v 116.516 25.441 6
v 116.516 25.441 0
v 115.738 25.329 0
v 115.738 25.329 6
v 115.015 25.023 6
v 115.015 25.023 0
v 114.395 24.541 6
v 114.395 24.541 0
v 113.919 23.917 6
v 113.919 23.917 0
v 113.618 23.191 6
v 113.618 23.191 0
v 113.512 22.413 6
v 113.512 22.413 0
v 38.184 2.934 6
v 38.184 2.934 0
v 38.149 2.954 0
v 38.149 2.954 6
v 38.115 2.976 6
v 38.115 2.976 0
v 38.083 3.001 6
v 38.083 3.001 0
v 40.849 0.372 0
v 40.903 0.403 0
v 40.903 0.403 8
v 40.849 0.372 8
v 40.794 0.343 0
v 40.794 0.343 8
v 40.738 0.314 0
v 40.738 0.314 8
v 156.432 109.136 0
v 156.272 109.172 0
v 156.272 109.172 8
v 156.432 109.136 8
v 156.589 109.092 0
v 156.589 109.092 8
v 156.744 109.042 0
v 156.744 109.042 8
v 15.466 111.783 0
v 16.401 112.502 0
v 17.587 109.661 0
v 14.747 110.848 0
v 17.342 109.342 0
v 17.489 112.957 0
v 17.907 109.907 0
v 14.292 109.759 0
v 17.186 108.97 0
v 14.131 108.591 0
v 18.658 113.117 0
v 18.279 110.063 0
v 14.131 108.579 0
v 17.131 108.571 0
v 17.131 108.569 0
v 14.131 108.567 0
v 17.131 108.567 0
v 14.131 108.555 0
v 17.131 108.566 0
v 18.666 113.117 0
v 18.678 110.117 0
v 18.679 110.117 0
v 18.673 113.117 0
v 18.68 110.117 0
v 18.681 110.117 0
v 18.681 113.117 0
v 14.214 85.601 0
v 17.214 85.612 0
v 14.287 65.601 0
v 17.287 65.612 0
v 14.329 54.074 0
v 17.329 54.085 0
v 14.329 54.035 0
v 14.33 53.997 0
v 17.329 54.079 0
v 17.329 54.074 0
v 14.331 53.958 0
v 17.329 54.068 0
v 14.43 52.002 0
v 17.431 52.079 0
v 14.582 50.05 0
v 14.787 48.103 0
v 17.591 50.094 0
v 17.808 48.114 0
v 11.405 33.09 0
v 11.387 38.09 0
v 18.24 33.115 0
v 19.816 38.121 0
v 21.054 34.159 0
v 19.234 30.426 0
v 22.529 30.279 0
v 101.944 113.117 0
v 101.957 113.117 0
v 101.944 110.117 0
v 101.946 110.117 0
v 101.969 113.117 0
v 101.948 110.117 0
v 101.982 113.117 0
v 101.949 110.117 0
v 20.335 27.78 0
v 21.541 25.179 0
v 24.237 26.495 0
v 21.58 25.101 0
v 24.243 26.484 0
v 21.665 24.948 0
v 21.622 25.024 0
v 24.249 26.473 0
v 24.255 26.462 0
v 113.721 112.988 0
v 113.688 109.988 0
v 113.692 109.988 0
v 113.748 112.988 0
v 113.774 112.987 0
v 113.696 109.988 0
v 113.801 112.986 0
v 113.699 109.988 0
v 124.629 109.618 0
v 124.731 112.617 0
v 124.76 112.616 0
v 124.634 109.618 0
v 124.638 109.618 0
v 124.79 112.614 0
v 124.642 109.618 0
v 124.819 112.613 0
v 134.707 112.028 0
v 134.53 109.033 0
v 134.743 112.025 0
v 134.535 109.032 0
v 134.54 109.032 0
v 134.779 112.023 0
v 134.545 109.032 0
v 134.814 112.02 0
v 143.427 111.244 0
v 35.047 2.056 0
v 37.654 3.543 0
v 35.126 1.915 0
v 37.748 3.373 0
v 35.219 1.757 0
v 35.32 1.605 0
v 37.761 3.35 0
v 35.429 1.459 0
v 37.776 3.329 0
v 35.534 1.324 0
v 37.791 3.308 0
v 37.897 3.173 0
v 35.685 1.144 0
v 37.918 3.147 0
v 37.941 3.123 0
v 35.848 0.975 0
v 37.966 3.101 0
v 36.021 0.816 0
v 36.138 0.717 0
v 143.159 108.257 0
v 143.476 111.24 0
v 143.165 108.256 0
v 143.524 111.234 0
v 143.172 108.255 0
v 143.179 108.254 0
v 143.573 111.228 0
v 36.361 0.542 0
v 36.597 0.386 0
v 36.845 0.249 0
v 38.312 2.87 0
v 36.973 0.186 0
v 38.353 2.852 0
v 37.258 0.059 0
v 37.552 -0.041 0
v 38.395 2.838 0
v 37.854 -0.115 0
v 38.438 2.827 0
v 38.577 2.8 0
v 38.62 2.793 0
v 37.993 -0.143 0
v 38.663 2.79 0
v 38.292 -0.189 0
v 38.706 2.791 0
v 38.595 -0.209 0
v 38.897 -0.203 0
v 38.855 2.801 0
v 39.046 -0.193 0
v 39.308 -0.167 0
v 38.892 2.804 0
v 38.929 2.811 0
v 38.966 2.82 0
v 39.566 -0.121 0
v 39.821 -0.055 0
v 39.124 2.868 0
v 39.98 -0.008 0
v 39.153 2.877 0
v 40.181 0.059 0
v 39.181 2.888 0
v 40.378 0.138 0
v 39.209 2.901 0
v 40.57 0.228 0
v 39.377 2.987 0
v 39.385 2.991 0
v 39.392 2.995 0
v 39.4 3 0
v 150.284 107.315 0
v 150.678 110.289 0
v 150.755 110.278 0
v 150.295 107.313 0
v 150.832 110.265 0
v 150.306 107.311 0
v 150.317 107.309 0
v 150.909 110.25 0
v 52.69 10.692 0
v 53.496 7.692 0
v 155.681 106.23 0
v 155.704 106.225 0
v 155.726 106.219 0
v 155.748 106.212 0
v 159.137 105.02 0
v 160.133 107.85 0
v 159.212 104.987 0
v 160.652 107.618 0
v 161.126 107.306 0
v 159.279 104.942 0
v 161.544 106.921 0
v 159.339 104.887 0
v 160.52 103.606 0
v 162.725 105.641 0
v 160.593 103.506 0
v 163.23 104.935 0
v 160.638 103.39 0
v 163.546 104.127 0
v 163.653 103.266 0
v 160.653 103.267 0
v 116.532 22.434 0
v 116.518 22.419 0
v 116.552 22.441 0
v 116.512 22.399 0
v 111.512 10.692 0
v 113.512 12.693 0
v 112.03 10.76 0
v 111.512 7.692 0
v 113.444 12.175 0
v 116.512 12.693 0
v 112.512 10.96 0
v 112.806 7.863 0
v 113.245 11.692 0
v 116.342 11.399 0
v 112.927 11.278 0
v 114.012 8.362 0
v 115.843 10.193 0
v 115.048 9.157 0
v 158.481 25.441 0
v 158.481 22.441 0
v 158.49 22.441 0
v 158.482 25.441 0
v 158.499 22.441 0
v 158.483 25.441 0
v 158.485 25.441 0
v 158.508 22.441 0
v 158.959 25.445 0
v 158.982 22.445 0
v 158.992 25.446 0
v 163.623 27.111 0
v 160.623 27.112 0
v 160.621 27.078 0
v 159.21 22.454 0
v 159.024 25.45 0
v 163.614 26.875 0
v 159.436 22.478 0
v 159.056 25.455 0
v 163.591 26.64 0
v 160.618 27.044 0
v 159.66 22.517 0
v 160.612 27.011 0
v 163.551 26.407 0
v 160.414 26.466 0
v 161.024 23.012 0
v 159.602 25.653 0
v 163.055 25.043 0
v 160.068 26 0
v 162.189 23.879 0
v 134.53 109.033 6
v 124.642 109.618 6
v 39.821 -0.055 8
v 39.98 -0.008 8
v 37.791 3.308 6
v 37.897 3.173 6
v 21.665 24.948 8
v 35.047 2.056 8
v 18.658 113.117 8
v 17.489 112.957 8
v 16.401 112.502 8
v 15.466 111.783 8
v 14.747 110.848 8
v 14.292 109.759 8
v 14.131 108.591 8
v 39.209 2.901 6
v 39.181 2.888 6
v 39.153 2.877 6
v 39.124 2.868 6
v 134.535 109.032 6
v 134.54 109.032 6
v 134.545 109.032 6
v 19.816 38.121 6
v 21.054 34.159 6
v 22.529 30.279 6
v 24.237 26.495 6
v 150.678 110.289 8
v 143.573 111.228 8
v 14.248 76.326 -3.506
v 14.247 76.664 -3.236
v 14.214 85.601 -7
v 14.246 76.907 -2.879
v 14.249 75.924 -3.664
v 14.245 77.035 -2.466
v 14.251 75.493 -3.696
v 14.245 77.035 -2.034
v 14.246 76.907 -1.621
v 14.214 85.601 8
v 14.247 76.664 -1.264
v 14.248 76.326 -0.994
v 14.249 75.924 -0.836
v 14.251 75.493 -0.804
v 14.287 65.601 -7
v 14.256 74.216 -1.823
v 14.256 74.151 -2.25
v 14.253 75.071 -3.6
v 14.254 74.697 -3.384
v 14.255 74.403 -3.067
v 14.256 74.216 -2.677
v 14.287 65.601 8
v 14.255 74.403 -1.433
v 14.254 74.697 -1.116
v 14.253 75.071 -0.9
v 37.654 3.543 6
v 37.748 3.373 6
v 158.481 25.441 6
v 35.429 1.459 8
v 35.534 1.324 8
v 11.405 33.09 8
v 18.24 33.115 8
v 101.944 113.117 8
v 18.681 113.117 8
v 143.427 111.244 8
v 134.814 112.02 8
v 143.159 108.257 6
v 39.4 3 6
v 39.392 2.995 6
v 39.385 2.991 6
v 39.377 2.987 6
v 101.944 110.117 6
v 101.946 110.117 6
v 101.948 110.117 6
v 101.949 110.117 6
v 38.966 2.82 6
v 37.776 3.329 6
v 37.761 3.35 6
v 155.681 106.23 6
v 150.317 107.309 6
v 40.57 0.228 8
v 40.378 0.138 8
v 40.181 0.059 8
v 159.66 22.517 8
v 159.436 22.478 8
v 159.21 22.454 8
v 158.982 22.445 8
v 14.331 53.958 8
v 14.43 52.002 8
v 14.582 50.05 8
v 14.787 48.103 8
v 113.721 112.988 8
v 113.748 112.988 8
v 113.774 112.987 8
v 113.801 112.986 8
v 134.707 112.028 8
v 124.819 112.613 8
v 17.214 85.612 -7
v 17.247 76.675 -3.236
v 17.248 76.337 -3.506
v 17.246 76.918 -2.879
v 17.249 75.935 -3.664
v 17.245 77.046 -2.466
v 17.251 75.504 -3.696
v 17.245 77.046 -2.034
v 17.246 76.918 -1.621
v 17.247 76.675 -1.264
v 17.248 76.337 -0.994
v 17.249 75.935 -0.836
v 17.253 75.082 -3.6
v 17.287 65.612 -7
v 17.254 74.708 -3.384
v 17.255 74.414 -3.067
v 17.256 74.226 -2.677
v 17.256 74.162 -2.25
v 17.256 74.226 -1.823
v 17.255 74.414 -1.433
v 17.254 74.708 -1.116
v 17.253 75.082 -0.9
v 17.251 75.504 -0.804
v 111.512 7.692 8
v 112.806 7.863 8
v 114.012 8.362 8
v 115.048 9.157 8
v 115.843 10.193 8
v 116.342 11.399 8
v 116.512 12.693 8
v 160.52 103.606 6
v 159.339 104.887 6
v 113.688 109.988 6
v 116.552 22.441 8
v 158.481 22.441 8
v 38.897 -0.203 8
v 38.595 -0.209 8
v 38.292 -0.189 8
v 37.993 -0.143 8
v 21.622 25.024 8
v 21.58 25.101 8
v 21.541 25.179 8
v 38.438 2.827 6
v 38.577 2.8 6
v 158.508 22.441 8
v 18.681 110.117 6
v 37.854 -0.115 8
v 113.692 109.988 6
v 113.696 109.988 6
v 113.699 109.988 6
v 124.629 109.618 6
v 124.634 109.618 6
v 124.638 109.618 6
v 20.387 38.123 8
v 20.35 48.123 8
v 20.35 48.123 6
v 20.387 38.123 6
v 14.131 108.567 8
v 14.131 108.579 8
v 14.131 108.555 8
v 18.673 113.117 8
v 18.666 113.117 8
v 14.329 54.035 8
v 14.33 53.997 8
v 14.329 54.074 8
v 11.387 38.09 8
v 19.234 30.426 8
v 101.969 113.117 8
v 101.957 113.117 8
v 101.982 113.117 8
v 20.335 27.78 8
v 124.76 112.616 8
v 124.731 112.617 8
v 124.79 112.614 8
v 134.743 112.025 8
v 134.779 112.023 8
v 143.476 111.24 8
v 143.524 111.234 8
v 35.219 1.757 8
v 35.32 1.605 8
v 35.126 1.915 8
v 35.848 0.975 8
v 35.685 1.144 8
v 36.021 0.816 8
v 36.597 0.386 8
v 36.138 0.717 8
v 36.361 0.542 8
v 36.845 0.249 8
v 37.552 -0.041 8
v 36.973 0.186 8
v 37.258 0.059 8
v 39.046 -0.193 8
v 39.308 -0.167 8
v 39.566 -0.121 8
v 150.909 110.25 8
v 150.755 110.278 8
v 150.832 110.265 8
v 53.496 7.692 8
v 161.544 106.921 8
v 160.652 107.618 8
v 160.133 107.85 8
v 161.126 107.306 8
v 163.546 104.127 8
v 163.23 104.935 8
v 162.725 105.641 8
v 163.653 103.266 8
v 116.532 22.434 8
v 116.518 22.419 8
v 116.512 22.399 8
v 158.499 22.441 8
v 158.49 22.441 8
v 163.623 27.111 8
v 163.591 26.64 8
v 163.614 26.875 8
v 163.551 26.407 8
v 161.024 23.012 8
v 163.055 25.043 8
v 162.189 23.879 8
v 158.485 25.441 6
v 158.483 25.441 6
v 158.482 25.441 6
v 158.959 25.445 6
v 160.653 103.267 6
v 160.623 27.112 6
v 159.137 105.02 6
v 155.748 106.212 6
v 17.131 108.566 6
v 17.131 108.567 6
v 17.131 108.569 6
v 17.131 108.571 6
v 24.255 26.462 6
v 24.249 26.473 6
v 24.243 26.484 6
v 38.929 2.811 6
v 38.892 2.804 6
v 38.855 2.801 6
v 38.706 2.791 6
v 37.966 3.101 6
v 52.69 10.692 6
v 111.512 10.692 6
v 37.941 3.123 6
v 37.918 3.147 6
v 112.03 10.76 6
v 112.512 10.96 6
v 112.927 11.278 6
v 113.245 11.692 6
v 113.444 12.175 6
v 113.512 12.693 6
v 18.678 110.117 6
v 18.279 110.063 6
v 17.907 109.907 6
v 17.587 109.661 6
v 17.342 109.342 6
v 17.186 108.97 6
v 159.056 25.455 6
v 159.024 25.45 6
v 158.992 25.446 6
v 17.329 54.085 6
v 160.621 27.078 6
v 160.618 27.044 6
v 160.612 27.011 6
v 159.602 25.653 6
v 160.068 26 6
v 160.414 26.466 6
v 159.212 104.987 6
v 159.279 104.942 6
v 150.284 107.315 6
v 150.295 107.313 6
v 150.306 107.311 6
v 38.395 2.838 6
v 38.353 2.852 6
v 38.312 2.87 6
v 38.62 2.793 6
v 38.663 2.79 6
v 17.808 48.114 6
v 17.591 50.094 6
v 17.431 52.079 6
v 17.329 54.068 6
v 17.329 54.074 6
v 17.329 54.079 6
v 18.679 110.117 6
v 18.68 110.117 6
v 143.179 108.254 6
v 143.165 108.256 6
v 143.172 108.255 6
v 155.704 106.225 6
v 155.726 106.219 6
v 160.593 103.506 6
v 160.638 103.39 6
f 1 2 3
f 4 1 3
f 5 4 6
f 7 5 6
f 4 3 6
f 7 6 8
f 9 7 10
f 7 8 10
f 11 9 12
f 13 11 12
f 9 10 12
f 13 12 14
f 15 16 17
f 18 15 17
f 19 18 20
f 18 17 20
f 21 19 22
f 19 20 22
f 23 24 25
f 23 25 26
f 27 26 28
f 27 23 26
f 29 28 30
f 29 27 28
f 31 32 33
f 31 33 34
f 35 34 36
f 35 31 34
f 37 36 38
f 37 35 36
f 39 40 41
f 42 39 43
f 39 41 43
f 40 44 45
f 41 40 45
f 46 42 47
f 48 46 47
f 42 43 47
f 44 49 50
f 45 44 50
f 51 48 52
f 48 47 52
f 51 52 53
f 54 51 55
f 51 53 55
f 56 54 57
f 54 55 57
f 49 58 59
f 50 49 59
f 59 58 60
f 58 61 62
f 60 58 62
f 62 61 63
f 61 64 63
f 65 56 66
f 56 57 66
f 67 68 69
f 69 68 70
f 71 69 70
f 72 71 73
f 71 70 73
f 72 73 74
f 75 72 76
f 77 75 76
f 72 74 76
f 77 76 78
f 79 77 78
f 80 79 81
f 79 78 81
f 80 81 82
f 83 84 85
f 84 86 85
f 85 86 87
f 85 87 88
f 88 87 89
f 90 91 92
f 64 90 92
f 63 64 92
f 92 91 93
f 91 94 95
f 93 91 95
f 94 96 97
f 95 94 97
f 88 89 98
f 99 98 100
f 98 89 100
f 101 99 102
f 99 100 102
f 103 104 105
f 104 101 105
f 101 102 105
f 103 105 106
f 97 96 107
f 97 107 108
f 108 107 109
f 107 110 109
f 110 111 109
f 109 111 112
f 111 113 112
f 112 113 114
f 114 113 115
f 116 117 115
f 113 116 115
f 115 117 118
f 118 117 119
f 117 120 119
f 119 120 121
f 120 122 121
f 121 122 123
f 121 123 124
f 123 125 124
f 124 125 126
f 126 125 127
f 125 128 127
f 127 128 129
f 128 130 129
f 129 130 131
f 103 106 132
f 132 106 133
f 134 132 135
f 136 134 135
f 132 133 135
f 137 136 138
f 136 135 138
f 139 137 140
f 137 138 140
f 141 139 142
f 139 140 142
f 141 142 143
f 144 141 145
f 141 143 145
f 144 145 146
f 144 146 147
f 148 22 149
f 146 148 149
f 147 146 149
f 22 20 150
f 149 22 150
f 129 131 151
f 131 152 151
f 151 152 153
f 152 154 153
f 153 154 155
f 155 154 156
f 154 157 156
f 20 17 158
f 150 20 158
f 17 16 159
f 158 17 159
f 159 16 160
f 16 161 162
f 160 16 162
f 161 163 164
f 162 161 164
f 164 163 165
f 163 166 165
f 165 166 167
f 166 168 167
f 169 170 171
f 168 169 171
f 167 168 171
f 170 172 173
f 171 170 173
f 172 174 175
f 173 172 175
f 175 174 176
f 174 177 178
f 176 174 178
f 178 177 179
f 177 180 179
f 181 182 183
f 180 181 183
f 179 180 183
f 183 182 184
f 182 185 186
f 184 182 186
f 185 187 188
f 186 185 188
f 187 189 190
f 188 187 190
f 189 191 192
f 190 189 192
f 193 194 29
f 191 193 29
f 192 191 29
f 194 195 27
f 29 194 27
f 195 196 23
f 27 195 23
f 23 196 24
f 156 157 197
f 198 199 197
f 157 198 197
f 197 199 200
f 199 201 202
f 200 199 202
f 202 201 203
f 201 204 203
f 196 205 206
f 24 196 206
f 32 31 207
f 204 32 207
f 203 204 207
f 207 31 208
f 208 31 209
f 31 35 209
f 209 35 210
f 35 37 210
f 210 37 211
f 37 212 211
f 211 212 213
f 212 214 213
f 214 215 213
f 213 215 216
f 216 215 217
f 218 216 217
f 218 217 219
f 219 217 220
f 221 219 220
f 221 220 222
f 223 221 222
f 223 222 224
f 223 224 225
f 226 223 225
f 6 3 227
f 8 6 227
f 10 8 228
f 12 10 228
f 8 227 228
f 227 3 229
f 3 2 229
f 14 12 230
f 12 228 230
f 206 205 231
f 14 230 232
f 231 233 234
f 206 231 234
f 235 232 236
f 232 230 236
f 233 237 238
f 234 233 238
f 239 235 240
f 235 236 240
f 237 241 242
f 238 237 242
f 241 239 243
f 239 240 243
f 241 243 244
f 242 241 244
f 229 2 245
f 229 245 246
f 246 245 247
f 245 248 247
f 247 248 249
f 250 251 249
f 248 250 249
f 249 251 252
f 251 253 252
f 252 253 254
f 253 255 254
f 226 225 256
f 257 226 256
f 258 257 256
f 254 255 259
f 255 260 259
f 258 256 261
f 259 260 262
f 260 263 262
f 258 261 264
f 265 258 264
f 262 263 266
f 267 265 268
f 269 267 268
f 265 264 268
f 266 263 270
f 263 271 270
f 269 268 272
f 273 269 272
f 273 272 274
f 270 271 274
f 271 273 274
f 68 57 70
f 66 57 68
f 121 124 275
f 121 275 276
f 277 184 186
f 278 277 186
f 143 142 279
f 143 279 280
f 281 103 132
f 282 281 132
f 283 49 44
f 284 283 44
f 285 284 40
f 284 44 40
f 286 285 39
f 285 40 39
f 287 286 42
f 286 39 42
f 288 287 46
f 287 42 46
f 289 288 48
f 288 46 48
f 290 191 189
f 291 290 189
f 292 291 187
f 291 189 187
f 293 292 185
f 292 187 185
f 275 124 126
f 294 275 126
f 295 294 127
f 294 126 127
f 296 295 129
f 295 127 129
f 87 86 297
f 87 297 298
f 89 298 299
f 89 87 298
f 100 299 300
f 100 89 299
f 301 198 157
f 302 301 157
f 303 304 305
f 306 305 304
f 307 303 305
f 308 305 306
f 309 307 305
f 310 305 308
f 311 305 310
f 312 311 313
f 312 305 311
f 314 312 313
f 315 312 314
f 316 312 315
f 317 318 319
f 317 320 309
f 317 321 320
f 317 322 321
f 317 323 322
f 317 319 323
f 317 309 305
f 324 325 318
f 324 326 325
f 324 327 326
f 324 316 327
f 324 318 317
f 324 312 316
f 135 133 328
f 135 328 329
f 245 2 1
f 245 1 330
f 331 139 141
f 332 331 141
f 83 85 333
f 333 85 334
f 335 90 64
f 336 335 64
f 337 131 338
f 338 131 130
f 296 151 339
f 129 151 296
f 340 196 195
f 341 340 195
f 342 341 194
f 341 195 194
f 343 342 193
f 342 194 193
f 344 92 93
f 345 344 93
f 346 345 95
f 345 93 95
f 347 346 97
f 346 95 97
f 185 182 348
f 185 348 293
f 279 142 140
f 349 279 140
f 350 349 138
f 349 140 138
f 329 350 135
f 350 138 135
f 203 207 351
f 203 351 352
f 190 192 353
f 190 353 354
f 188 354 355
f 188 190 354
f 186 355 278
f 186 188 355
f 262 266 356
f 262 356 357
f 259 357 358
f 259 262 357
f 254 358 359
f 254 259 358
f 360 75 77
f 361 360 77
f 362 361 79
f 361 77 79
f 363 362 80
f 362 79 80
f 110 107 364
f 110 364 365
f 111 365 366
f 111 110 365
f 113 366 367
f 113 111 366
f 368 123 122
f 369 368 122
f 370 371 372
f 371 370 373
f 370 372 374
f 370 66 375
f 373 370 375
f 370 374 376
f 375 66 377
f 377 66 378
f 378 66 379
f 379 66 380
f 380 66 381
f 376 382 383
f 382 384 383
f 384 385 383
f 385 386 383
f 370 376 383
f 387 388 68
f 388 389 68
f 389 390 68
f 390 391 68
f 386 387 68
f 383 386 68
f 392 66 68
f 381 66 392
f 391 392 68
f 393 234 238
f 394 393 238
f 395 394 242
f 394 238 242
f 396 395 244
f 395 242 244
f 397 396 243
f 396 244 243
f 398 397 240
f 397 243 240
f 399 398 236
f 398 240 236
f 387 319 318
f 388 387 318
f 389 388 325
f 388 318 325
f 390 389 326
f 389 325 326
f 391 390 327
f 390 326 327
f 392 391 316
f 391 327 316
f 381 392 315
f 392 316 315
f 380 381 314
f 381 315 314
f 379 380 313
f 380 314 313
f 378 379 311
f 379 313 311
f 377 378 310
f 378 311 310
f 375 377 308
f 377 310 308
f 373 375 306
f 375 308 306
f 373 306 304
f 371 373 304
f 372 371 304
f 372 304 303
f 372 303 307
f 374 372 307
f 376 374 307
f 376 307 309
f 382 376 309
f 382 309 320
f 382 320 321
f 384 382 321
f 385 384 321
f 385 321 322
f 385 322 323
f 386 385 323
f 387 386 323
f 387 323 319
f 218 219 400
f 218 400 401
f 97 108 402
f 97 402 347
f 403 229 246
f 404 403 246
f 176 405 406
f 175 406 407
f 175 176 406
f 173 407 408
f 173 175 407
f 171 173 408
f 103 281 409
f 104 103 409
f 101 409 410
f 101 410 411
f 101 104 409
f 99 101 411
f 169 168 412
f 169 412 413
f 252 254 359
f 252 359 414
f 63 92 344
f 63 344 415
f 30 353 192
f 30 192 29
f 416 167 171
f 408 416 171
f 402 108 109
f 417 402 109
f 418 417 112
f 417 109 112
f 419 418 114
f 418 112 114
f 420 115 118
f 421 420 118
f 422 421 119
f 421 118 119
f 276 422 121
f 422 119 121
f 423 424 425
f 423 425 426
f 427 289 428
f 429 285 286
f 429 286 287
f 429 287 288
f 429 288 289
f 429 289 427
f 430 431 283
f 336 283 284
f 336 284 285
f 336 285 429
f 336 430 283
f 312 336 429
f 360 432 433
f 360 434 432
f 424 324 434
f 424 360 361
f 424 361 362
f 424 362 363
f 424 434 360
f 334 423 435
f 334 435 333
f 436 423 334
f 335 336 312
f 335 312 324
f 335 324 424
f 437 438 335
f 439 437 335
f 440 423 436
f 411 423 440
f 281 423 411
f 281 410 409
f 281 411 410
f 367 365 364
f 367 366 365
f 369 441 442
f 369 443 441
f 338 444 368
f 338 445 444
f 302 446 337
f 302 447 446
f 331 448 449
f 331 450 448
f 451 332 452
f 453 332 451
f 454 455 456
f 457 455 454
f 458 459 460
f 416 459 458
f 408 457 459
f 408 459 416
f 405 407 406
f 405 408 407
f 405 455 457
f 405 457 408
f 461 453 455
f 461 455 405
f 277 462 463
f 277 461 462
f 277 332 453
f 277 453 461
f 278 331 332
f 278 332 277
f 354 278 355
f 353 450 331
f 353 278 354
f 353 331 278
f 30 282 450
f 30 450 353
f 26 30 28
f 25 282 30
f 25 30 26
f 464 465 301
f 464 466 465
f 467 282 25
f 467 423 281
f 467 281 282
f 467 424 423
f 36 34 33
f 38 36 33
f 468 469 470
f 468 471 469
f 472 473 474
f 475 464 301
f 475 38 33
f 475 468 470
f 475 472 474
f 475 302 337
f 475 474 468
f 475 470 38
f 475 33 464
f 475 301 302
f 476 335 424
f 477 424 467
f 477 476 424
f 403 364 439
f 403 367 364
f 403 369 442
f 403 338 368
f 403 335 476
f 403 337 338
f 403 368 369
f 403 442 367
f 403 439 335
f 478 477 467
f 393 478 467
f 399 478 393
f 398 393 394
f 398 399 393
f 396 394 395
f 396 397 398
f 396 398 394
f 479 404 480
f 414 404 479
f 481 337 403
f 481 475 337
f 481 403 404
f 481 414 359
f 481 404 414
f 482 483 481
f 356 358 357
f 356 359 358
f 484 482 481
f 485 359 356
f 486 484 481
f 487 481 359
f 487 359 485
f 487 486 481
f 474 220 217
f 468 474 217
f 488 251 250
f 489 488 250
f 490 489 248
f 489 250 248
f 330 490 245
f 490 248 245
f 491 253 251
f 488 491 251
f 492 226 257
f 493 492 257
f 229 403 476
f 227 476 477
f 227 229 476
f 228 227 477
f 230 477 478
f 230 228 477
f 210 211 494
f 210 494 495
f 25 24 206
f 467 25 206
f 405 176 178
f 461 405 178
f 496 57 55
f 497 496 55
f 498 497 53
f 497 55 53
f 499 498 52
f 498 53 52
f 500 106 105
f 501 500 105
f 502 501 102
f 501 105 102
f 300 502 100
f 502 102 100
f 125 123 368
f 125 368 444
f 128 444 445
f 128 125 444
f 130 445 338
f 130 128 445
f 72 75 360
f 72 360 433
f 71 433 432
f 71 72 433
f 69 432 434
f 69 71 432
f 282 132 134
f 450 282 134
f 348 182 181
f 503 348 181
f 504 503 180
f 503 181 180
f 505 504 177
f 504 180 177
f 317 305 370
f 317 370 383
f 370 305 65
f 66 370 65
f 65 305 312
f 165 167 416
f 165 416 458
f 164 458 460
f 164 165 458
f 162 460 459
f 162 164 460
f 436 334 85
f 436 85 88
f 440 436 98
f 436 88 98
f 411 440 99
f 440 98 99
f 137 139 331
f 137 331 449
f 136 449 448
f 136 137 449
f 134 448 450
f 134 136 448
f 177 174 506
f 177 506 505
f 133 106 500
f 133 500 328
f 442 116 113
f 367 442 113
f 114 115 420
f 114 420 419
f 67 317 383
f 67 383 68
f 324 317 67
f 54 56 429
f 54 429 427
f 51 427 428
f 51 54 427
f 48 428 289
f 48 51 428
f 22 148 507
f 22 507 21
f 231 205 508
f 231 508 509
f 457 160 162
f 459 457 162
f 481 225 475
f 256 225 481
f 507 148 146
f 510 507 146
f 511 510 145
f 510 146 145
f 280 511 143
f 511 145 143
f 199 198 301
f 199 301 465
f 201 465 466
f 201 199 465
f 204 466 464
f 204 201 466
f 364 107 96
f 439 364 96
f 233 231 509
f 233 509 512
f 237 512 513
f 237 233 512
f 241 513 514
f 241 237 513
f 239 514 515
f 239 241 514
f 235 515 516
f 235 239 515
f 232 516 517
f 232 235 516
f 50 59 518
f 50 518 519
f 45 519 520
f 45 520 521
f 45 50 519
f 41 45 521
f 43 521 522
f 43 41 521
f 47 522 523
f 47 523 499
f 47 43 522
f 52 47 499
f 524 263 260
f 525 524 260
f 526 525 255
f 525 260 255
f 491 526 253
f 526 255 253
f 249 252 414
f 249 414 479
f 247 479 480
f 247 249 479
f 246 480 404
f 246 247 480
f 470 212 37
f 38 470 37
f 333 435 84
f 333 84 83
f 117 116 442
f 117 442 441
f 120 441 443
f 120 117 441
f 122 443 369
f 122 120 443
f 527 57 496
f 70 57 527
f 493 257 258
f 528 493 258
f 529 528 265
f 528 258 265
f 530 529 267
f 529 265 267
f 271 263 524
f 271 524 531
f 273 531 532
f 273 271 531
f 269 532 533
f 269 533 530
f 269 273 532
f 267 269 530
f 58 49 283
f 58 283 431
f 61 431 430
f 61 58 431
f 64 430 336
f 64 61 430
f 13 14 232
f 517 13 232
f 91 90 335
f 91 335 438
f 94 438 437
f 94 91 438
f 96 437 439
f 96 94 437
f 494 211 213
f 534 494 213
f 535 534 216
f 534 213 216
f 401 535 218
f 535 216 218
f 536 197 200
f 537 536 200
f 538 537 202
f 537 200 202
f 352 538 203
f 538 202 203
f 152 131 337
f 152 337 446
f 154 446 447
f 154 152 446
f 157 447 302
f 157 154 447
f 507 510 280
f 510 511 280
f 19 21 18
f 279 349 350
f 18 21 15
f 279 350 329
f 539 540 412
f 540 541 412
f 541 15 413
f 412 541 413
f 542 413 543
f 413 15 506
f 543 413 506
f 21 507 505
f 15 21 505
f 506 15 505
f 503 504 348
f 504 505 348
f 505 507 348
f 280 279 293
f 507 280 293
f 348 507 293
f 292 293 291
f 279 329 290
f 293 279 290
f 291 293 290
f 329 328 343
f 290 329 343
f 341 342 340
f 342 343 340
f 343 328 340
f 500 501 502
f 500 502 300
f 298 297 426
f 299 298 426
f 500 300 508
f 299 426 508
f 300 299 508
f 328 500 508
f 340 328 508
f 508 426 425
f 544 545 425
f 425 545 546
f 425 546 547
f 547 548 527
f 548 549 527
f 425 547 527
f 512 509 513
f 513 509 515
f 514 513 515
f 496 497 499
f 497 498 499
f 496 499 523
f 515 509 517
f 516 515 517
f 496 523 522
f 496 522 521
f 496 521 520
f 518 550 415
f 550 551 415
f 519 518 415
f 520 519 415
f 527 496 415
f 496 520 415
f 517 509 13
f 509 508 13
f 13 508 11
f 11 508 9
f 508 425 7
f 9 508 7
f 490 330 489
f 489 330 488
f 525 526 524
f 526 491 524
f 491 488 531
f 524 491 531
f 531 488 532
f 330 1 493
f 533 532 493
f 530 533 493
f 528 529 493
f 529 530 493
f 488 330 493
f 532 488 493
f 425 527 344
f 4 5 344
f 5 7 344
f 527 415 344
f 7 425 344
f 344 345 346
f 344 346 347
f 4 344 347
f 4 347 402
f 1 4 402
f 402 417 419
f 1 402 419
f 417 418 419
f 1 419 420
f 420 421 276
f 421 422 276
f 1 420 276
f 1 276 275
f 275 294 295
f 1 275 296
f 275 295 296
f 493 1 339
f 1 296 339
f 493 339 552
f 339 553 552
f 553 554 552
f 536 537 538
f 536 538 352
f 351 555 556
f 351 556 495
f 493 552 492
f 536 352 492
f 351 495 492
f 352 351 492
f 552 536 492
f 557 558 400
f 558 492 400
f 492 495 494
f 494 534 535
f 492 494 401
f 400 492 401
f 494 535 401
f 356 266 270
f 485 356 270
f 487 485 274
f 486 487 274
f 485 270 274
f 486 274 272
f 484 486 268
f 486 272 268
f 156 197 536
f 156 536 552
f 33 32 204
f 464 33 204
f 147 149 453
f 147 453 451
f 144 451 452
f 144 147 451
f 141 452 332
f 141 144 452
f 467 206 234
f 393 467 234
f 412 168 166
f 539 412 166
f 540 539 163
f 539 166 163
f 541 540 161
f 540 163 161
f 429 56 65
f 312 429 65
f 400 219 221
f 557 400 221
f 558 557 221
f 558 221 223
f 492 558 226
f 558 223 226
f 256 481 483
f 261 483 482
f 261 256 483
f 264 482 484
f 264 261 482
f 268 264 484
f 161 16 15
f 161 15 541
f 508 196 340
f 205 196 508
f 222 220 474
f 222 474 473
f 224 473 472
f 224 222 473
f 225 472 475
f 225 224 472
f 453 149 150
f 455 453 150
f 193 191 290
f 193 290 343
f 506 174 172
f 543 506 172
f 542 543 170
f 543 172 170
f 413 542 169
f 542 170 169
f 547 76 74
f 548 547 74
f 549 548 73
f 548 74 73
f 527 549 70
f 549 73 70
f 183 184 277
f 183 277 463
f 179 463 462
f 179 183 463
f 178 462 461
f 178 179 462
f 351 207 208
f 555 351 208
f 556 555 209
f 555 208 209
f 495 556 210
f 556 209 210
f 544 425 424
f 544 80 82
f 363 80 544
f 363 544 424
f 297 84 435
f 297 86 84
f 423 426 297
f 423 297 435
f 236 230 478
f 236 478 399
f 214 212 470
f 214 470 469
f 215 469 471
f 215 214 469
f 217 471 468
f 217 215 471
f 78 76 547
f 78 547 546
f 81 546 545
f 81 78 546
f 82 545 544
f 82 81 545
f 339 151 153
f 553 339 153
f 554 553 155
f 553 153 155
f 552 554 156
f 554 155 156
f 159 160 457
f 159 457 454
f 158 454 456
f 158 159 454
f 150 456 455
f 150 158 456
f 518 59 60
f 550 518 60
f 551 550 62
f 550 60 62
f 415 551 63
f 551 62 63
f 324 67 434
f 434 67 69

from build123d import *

# Parameters (mm, degrees)
PAD009_DEPTH    = 8
POCKET005_DEPTH = 6
SKETCH044_W     = 20
SKETCH044_H     = 15
PAD010_DEPTH    = 3
SKETCH045_R     = 1.45
POCKET006_DEPTH = 149.538323
SKETCH046_W     = 10
SKETCH046_H     = 20
POCKET007_DEPTH = 6
SKETCH047_W     = 5
SKETCH047_H     = 8
PAD011_DEPTH    = 4
PAD012_DEPTH    = 3


with BuildPart() as part:
    # Sketch042 → Pad009 (new body)
    with BuildSketch(Plane.XY):
        with BuildLine():
            ThreePointArc((14.331049, 53.958076), (14.329401, 54.015983), (14.328712, 54.073909))
            Line((14.131233, 108.554683), (14.328712, 54.073909))
            ThreePointArc((14.131233, 108.554683), (14.131214, 108.572623), (14.131287, 108.590561))
            ThreePointArc((18.658021, 113.117293), (15.46591, 111.782672), (14.131287, 108.590561))
            ThreePointArc((18.658021, 113.117293), (18.669616, 113.117351), (18.681211, 113.11737))
            Line((101.94388, 113.11737), (18.681211, 113.11737))
            ThreePointArc((101.94388, 113.11737), (101.963094, 113.117317), (101.982307, 113.117159))
            Line((113.720987, 112.988269), (101.982307, 113.117159))
            ThreePointArc((113.720987, 112.988269), (113.760941, 112.987602), (113.800884, 112.986479))
            Line((124.730854, 112.616759), (113.800884, 112.986479))
            ThreePointArc((124.730854, 112.616759), (124.775077, 112.614983), (124.819274, 112.612649))
            Line((134.707394, 112.027539), (124.819274, 112.612649))
            ThreePointArc((134.707394, 112.027539), (134.760897, 112.023961), (134.814338, 112.019564))
            Line((143.427438, 111.244494), (134.814338, 112.019564))
            ThreePointArc((143.427438, 111.244494), (143.500111, 111.23719), (143.572616, 111.22837))
            Line((150.677556, 110.28877), (143.572616, 111.22837))
            ThreePointArc((150.677556, 110.28877), (150.793483, 110.271459), (150.908765, 110.250277))
            Line((156.272395, 109.171587), (150.908765, 110.250277))
            ThreePointArc((156.272395, 109.171587), (156.5104, 109.115), (156.743872, 109.041926))
            Line((160.133022, 107.849586), (156.743872, 109.041926))
            ThreePointArc((160.133022, 107.849586), (160.895244, 107.471834), (161.543817, 106.92135))
            Line((162.725347, 105.64078), (161.543817, 106.92135))
            ThreePointArc((162.725347, 105.64078), (163.413102, 104.540852), (163.653, 103.265981))
            Line((163.653, 103.265981), (163.62255, 27.110501))
            ThreePointArc((163.62255, 27.110501), (163.60451, 26.756997), (163.550857, 26.407123))
            ThreePointArc((159.660239, 22.516538), (162.188858, 23.878516), (163.550857, 26.407123))
            ThreePointArc((159.660239, 22.516538), (159.323063, 22.464205), (158.982393, 22.444954))
            Line((158.982393, 22.444954), (158.507799, 22.441306))
            ThreePointArc((158.507799, 22.441306), (158.494348, 22.441228), (158.480896, 22.441202))
            Line((116.551548, 22.441202), (158.480896, 22.441202))
            ThreePointArc((116.551548, 22.441202), (116.524186, 22.427455), (116.51234, 22.399217))
            Line((116.51234, 22.399217), (116.51234, 12.693214))
            ThreePointArc((111.511608, 7.69248), (115.048134, 9.156687), (116.51234, 12.693214))
            Line((53.496079, 7.69248), (111.511608, 7.69248))
            Line((40.903121, 0.40324), (53.496079, 7.69248))
            ThreePointArc((40.903121, 0.40324), (40.82134, 0.357354), (40.738359, 0.313675))
            Line((40.570469, 0.228155), (40.738359, 0.313675))
            ThreePointArc((40.570469, 0.228155), (40.28044, 0.096677), (39.97966, -0.007897))
            Line((39.821, -0.055087), (39.97966, -0.007897))
            ThreePointArc((39.821, -0.055087), (39.4375, -0.145999), (39.04621, -0.193218))
            Line((38.89726, -0.202728), (39.04621, -0.193218))
            ThreePointArc((38.89726, -0.202728), (38.443297, -0.202212), (37.99322, -0.142943))
            Line((37.85444, -0.115413), (37.99322, -0.142943))
            ThreePointArc((37.85444, -0.115413), (37.403892, 0.005662), (36.973449, 0.185583))
            Line((36.845299, 0.249493), (36.973449, 0.185583))
            ThreePointArc((36.845299, 0.249493), (36.477576, 0.461653), (36.138245, 0.716774))
            Line((36.021215, 0.816424), (36.138245, 0.716774))
            ThreePointArc((36.021215, 0.816424), (35.764889, 1.057957), (35.534135, 1.324028))
            Line((35.428675, 1.458768), (35.534135, 1.324028))
            ThreePointArc((35.428675, 1.458768), (35.268511, 1.680768), (35.126187, 1.914607))
            Line((35.047407, 2.056233), (35.126187, 1.914607))
            Line((21.664757, 24.948224), (35.047407, 2.056233))
            ThreePointArc((21.664757, 24.948224), (21.600836, 25.062414), (21.541228, 25.178913))
            ThreePointArc((14.331049, 53.958076), (16.428723, 39.190834), (21.541228, 25.178913))
        make_face()
    extrude(amount=PAD009_DEPTH)

    # Sketch043 → Pocket005 (cut)
    with BuildSketch(Plane.XY):
        with BuildLine():
            ThreePointArc((17.329026, 54.068236), (19.338784, 39.919906), (24.237019, 26.495239))
            ThreePointArc((24.254666, 26.462283), (24.245534, 26.478596), (24.237019, 26.495239))
            Line((24.254666, 26.462283), (37.653506, 3.542597))
            Line((37.653506, 3.542597), (37.747881, 3.372935))
            ThreePointArc((37.791094, 3.307815), (37.768213, 3.33953), (37.747881, 3.372935))
            Line((37.791094, 3.307815), (37.896554, 3.173075))
            ThreePointArc((37.966136, 3.100561), (37.929518, 3.135065), (37.896554, 3.173075))
            Line((37.966136, 3.100561), (38.083166, 3.000911))
            ThreePointArc((38.184174, 2.934156), (38.131642, 2.964465), (38.083166, 3.000911))
            Line((38.184174, 2.934156), (38.312324, 2.870246))
            ThreePointArc((38.43818, 2.827247), (38.373816, 2.844543), (38.312324, 2.870246))
            Line((38.43818, 2.827247), (38.57696, 2.799717))
            ThreePointArc((38.706109, 2.791176), (38.641257, 2.79125), (38.57696, 2.799717))
            Line((38.706109, 2.791176), (38.855059, 2.800686))
            ThreePointArc((38.965743, 2.820419), (38.910957, 2.807432), (38.855059, 2.800686))
            Line((38.965743, 2.820419), (39.124403, 2.867609))
            ThreePointArc((39.208804, 2.901331), (39.167371, 2.882548), (39.124403, 2.867609))
            Line((39.208804, 2.901331), (39.376694, 2.986851))
            ThreePointArc((39.400232, 2.999646), (39.388549, 2.993091), (39.376694, 2.986851))
            Line((39.400232, 2.999646), (52.690443, 10.69248))
            Line((52.690443, 10.69248), (111.512203, 10.69248))
            ThreePointArc((111.512203, 10.69248), (112.926813, 11.278007), (113.51234, 12.692618))
            Line((113.51234, 22.413147), (113.51234, 12.692618))
            ThreePointArc((116.515571, 25.441202), (114.395073, 24.540983), (113.51234, 22.413147))
            Line((116.515571, 25.441202), (158.480896, 25.441202))
            ThreePointArc((158.484739, 25.441217), (158.482818, 25.441206), (158.480896, 25.441202))
            Line((158.959333, 25.444865), (158.484739, 25.441217))
            ThreePointArc((159.056169, 25.455091), (159.008, 25.447615), (158.959333, 25.444865))
            ThreePointArc((159.056169, 25.455091), (160.067546, 25.999845), (160.612308, 27.011218))
            ThreePointArc((160.62255, 27.111701), (160.619973, 27.0612), (160.612308, 27.011218))
            Line((160.653, 103.26718), (160.62255, 27.111701))
            ThreePointArc((160.520478, 103.606437), (160.618729, 103.449305), (160.653, 103.26718))
            Line((160.520478, 103.606437), (159.338948, 104.887007))
            ThreePointArc((159.137406, 105.019612), (159.246295, 104.965648), (159.338948, 104.887007))
            Line((159.137406, 105.019612), (155.748256, 106.211952))
            ThreePointArc((155.680902, 106.230475), (155.714903, 106.222391), (155.748256, 106.211952))
            Line((155.680902, 106.230475), (150.317272, 107.309165))
            ThreePointArc((150.284242, 107.314664), (150.300803, 107.312191), (150.317272, 107.309165))
            Line((150.284242, 107.314664), (143.179302, 108.254264))
            ThreePointArc((143.158563, 108.256568), (143.168944, 108.255524), (143.179302, 108.254264))
            Line((143.158563, 108.256568), (134.545463, 109.031638))
            ThreePointArc((134.530185, 109.032777), (134.537828, 109.032266), (134.545463, 109.031638))
            Line((134.530185, 109.032777), (124.642065, 109.617887))
            ThreePointArc((124.629433, 109.618474), (124.635751, 109.61822), (124.642065, 109.617887))
            Line((124.629433, 109.618474), (113.699463, 109.988194))
            ThreePointArc((113.68805, 109.98845), (113.693757, 109.988355), (113.699463, 109.988194))
            Line((113.68805, 109.98845), (101.94937, 110.11734))
            ThreePointArc((101.94388, 110.11737), (101.946625, 110.117362), (101.94937, 110.11734))
            Line((101.94388, 110.11737), (18.681211, 110.11737))
            ThreePointArc((18.677898, 110.117359), (18.679554, 110.117367), (18.681211, 110.11737))
            ThreePointArc((18.677898, 110.117359), (17.58723, 109.661351), (17.131221, 108.570683))
            ThreePointArc((17.131213, 108.565558), (17.131211, 108.56812), (17.131221, 108.570683))
            Line((17.131213, 108.565558), (17.328692, 54.084784))
            ThreePointArc((17.329026, 54.068236), (17.328791, 54.076508), (17.328692, 54.084784))
        make_face()
    extrude(amount=POCKET005_DEPTH, mode=Mode.SUBTRACT)

    # Sketch044 → Pad010 (new body)
    with BuildSketch(Plane(origin=(14.524525, 0.052648, 0), x_dir=(0.003625, -0.999993, 0), z_dir=(-0.999993, -0.003625, 0))):
        with Locations((-75.54892, 0.5)):
            Rectangle(SKETCH044_W, SKETCH044_H)
    extrude(amount=-PAD010_DEPTH)

    # Sketch045 (on Face112 of Pad010) → Pocket006 (cut, through all)
    with BuildSketch(Plane(origin=(14.524525, 0.052648, 0), x_dir=(0.003625, -0.999993, 0), z_dir=(-0.999993, -0.003625, 0))):
        with Locations((-75.54892, -2.25)):
            Circle(SKETCH045_R)
    extrude(amount=-POCKET006_DEPTH, mode=Mode.SUBTRACT)

    # Sketch046 (on Face3 of Pocket006) → Pocket007 (cut)
    with BuildSketch(Plane(origin=(14.524525, 0.052648, 0), x_dir=(0.003625, -0.999993, 0), z_dir=(-0.999993, -0.003625, 0))):
        with Locations((-43.04892, -2)):
            Rectangle(SKETCH046_W, SKETCH046_H)
    extrude(amount=-POCKET007_DEPTH, mode=Mode.SUBTRACT)

    # Sketch047 (on Face3 of Pocket007) → Pad011 (new body)
    with BuildSketch(Plane(origin=(14.524525, 0.052648, 0), x_dir=(0.003625, -0.999993, 0), z_dir=(-0.999993, -0.003625, 0))):
        with Locations((-35.54892, 4)):
            Rectangle(SKETCH047_W, SKETCH047_H)
    extrude(amount=-PAD011_DEPTH)

    # Sketch047 (on Face3 of Pocket007) → Pad012 (new body)
    with BuildSketch(Plane(origin=(14.524525, 0.052648, 0), x_dir=(0.003625, -0.999993, 0), z_dir=(-0.999993, -0.003625, 0))):
        with Locations((-35.54892, 4)):
            Rectangle(SKETCH047_W, SKETCH047_H)
    extrude(amount=PAD012_DEPTH)


solid = part.part
